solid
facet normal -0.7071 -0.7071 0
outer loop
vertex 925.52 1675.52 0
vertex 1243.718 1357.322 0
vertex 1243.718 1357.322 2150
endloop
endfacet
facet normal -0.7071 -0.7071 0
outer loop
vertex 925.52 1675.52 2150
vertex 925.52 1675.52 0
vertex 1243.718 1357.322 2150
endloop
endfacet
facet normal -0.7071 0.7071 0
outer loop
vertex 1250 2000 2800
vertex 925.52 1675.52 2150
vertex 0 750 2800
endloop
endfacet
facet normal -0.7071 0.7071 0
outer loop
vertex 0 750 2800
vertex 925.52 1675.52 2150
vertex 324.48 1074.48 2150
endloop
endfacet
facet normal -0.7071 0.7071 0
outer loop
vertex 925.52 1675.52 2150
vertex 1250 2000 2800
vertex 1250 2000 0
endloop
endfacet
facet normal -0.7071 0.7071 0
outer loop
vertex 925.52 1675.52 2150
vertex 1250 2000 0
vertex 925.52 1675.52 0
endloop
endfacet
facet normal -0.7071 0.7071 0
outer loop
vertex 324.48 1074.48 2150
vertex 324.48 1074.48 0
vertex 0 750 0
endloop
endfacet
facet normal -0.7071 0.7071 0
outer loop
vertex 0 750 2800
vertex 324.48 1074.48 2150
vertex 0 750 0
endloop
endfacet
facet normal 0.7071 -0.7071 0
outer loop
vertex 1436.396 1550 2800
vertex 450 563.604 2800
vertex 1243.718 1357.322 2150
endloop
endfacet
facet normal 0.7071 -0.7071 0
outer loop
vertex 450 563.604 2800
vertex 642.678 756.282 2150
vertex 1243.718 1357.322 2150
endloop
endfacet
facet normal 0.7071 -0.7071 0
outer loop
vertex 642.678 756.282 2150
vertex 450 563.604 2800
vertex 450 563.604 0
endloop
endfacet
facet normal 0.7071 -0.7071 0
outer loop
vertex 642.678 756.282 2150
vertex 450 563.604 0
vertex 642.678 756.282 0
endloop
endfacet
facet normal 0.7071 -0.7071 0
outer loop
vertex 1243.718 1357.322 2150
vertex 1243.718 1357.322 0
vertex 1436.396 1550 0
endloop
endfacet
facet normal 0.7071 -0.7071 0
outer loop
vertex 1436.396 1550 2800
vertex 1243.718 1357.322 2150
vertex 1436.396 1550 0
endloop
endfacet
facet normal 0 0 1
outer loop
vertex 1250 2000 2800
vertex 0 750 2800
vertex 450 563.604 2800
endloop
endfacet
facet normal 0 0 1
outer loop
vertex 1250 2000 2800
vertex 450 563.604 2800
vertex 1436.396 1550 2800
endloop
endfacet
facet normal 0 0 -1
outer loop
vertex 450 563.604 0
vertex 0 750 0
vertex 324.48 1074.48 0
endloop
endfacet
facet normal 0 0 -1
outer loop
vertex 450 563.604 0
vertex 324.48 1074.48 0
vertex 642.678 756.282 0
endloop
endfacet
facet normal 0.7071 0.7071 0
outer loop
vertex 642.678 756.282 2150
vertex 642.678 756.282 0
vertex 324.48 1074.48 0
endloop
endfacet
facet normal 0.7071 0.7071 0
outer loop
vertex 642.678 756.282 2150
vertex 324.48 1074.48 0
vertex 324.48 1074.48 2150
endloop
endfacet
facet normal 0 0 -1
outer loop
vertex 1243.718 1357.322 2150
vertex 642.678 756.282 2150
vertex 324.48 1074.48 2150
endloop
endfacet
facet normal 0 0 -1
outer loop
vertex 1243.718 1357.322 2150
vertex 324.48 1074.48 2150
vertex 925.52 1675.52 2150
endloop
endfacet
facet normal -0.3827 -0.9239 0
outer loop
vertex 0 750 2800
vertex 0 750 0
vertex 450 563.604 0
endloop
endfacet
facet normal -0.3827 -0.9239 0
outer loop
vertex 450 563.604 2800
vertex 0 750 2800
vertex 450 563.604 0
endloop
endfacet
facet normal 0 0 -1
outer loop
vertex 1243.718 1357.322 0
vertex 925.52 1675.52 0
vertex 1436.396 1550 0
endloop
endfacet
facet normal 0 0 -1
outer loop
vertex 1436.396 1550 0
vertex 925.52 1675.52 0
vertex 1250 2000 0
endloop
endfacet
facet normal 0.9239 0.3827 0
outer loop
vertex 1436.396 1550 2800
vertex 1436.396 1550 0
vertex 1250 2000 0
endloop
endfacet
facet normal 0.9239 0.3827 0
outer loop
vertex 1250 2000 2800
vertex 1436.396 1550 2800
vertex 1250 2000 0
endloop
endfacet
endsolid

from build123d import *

# Parameters (mm, degrees)
F1_DEPTH = 2800
F2_W     = 850
F2_H     = 2150
F3_DEPTH = 1333.884476


with BuildPart() as f1:
    # F0 (on Top) → F1 (new body)
    with BuildSketch(Plane.XY):
        Polygon((1250, 2000), (0, 750), (450, 563.603897), (1436.396103, 1550), align=None)
    extrude(amount=F1_DEPTH)

    # F2 (on face) → F3 (cut, through all)
    with BuildSketch(Plane(origin=(-56.801948, 56.801948, 0), x_dir=(0.707107, 0.707107, 0), z_dir=(0.707107, -0.707107, 0))):
        with Locations((1414.213562, 1075)):
            Rectangle(F2_W, F2_H)
    extrude(amount=-F3_DEPTH, mode=Mode.SUBTRACT)


solid = f1.part
